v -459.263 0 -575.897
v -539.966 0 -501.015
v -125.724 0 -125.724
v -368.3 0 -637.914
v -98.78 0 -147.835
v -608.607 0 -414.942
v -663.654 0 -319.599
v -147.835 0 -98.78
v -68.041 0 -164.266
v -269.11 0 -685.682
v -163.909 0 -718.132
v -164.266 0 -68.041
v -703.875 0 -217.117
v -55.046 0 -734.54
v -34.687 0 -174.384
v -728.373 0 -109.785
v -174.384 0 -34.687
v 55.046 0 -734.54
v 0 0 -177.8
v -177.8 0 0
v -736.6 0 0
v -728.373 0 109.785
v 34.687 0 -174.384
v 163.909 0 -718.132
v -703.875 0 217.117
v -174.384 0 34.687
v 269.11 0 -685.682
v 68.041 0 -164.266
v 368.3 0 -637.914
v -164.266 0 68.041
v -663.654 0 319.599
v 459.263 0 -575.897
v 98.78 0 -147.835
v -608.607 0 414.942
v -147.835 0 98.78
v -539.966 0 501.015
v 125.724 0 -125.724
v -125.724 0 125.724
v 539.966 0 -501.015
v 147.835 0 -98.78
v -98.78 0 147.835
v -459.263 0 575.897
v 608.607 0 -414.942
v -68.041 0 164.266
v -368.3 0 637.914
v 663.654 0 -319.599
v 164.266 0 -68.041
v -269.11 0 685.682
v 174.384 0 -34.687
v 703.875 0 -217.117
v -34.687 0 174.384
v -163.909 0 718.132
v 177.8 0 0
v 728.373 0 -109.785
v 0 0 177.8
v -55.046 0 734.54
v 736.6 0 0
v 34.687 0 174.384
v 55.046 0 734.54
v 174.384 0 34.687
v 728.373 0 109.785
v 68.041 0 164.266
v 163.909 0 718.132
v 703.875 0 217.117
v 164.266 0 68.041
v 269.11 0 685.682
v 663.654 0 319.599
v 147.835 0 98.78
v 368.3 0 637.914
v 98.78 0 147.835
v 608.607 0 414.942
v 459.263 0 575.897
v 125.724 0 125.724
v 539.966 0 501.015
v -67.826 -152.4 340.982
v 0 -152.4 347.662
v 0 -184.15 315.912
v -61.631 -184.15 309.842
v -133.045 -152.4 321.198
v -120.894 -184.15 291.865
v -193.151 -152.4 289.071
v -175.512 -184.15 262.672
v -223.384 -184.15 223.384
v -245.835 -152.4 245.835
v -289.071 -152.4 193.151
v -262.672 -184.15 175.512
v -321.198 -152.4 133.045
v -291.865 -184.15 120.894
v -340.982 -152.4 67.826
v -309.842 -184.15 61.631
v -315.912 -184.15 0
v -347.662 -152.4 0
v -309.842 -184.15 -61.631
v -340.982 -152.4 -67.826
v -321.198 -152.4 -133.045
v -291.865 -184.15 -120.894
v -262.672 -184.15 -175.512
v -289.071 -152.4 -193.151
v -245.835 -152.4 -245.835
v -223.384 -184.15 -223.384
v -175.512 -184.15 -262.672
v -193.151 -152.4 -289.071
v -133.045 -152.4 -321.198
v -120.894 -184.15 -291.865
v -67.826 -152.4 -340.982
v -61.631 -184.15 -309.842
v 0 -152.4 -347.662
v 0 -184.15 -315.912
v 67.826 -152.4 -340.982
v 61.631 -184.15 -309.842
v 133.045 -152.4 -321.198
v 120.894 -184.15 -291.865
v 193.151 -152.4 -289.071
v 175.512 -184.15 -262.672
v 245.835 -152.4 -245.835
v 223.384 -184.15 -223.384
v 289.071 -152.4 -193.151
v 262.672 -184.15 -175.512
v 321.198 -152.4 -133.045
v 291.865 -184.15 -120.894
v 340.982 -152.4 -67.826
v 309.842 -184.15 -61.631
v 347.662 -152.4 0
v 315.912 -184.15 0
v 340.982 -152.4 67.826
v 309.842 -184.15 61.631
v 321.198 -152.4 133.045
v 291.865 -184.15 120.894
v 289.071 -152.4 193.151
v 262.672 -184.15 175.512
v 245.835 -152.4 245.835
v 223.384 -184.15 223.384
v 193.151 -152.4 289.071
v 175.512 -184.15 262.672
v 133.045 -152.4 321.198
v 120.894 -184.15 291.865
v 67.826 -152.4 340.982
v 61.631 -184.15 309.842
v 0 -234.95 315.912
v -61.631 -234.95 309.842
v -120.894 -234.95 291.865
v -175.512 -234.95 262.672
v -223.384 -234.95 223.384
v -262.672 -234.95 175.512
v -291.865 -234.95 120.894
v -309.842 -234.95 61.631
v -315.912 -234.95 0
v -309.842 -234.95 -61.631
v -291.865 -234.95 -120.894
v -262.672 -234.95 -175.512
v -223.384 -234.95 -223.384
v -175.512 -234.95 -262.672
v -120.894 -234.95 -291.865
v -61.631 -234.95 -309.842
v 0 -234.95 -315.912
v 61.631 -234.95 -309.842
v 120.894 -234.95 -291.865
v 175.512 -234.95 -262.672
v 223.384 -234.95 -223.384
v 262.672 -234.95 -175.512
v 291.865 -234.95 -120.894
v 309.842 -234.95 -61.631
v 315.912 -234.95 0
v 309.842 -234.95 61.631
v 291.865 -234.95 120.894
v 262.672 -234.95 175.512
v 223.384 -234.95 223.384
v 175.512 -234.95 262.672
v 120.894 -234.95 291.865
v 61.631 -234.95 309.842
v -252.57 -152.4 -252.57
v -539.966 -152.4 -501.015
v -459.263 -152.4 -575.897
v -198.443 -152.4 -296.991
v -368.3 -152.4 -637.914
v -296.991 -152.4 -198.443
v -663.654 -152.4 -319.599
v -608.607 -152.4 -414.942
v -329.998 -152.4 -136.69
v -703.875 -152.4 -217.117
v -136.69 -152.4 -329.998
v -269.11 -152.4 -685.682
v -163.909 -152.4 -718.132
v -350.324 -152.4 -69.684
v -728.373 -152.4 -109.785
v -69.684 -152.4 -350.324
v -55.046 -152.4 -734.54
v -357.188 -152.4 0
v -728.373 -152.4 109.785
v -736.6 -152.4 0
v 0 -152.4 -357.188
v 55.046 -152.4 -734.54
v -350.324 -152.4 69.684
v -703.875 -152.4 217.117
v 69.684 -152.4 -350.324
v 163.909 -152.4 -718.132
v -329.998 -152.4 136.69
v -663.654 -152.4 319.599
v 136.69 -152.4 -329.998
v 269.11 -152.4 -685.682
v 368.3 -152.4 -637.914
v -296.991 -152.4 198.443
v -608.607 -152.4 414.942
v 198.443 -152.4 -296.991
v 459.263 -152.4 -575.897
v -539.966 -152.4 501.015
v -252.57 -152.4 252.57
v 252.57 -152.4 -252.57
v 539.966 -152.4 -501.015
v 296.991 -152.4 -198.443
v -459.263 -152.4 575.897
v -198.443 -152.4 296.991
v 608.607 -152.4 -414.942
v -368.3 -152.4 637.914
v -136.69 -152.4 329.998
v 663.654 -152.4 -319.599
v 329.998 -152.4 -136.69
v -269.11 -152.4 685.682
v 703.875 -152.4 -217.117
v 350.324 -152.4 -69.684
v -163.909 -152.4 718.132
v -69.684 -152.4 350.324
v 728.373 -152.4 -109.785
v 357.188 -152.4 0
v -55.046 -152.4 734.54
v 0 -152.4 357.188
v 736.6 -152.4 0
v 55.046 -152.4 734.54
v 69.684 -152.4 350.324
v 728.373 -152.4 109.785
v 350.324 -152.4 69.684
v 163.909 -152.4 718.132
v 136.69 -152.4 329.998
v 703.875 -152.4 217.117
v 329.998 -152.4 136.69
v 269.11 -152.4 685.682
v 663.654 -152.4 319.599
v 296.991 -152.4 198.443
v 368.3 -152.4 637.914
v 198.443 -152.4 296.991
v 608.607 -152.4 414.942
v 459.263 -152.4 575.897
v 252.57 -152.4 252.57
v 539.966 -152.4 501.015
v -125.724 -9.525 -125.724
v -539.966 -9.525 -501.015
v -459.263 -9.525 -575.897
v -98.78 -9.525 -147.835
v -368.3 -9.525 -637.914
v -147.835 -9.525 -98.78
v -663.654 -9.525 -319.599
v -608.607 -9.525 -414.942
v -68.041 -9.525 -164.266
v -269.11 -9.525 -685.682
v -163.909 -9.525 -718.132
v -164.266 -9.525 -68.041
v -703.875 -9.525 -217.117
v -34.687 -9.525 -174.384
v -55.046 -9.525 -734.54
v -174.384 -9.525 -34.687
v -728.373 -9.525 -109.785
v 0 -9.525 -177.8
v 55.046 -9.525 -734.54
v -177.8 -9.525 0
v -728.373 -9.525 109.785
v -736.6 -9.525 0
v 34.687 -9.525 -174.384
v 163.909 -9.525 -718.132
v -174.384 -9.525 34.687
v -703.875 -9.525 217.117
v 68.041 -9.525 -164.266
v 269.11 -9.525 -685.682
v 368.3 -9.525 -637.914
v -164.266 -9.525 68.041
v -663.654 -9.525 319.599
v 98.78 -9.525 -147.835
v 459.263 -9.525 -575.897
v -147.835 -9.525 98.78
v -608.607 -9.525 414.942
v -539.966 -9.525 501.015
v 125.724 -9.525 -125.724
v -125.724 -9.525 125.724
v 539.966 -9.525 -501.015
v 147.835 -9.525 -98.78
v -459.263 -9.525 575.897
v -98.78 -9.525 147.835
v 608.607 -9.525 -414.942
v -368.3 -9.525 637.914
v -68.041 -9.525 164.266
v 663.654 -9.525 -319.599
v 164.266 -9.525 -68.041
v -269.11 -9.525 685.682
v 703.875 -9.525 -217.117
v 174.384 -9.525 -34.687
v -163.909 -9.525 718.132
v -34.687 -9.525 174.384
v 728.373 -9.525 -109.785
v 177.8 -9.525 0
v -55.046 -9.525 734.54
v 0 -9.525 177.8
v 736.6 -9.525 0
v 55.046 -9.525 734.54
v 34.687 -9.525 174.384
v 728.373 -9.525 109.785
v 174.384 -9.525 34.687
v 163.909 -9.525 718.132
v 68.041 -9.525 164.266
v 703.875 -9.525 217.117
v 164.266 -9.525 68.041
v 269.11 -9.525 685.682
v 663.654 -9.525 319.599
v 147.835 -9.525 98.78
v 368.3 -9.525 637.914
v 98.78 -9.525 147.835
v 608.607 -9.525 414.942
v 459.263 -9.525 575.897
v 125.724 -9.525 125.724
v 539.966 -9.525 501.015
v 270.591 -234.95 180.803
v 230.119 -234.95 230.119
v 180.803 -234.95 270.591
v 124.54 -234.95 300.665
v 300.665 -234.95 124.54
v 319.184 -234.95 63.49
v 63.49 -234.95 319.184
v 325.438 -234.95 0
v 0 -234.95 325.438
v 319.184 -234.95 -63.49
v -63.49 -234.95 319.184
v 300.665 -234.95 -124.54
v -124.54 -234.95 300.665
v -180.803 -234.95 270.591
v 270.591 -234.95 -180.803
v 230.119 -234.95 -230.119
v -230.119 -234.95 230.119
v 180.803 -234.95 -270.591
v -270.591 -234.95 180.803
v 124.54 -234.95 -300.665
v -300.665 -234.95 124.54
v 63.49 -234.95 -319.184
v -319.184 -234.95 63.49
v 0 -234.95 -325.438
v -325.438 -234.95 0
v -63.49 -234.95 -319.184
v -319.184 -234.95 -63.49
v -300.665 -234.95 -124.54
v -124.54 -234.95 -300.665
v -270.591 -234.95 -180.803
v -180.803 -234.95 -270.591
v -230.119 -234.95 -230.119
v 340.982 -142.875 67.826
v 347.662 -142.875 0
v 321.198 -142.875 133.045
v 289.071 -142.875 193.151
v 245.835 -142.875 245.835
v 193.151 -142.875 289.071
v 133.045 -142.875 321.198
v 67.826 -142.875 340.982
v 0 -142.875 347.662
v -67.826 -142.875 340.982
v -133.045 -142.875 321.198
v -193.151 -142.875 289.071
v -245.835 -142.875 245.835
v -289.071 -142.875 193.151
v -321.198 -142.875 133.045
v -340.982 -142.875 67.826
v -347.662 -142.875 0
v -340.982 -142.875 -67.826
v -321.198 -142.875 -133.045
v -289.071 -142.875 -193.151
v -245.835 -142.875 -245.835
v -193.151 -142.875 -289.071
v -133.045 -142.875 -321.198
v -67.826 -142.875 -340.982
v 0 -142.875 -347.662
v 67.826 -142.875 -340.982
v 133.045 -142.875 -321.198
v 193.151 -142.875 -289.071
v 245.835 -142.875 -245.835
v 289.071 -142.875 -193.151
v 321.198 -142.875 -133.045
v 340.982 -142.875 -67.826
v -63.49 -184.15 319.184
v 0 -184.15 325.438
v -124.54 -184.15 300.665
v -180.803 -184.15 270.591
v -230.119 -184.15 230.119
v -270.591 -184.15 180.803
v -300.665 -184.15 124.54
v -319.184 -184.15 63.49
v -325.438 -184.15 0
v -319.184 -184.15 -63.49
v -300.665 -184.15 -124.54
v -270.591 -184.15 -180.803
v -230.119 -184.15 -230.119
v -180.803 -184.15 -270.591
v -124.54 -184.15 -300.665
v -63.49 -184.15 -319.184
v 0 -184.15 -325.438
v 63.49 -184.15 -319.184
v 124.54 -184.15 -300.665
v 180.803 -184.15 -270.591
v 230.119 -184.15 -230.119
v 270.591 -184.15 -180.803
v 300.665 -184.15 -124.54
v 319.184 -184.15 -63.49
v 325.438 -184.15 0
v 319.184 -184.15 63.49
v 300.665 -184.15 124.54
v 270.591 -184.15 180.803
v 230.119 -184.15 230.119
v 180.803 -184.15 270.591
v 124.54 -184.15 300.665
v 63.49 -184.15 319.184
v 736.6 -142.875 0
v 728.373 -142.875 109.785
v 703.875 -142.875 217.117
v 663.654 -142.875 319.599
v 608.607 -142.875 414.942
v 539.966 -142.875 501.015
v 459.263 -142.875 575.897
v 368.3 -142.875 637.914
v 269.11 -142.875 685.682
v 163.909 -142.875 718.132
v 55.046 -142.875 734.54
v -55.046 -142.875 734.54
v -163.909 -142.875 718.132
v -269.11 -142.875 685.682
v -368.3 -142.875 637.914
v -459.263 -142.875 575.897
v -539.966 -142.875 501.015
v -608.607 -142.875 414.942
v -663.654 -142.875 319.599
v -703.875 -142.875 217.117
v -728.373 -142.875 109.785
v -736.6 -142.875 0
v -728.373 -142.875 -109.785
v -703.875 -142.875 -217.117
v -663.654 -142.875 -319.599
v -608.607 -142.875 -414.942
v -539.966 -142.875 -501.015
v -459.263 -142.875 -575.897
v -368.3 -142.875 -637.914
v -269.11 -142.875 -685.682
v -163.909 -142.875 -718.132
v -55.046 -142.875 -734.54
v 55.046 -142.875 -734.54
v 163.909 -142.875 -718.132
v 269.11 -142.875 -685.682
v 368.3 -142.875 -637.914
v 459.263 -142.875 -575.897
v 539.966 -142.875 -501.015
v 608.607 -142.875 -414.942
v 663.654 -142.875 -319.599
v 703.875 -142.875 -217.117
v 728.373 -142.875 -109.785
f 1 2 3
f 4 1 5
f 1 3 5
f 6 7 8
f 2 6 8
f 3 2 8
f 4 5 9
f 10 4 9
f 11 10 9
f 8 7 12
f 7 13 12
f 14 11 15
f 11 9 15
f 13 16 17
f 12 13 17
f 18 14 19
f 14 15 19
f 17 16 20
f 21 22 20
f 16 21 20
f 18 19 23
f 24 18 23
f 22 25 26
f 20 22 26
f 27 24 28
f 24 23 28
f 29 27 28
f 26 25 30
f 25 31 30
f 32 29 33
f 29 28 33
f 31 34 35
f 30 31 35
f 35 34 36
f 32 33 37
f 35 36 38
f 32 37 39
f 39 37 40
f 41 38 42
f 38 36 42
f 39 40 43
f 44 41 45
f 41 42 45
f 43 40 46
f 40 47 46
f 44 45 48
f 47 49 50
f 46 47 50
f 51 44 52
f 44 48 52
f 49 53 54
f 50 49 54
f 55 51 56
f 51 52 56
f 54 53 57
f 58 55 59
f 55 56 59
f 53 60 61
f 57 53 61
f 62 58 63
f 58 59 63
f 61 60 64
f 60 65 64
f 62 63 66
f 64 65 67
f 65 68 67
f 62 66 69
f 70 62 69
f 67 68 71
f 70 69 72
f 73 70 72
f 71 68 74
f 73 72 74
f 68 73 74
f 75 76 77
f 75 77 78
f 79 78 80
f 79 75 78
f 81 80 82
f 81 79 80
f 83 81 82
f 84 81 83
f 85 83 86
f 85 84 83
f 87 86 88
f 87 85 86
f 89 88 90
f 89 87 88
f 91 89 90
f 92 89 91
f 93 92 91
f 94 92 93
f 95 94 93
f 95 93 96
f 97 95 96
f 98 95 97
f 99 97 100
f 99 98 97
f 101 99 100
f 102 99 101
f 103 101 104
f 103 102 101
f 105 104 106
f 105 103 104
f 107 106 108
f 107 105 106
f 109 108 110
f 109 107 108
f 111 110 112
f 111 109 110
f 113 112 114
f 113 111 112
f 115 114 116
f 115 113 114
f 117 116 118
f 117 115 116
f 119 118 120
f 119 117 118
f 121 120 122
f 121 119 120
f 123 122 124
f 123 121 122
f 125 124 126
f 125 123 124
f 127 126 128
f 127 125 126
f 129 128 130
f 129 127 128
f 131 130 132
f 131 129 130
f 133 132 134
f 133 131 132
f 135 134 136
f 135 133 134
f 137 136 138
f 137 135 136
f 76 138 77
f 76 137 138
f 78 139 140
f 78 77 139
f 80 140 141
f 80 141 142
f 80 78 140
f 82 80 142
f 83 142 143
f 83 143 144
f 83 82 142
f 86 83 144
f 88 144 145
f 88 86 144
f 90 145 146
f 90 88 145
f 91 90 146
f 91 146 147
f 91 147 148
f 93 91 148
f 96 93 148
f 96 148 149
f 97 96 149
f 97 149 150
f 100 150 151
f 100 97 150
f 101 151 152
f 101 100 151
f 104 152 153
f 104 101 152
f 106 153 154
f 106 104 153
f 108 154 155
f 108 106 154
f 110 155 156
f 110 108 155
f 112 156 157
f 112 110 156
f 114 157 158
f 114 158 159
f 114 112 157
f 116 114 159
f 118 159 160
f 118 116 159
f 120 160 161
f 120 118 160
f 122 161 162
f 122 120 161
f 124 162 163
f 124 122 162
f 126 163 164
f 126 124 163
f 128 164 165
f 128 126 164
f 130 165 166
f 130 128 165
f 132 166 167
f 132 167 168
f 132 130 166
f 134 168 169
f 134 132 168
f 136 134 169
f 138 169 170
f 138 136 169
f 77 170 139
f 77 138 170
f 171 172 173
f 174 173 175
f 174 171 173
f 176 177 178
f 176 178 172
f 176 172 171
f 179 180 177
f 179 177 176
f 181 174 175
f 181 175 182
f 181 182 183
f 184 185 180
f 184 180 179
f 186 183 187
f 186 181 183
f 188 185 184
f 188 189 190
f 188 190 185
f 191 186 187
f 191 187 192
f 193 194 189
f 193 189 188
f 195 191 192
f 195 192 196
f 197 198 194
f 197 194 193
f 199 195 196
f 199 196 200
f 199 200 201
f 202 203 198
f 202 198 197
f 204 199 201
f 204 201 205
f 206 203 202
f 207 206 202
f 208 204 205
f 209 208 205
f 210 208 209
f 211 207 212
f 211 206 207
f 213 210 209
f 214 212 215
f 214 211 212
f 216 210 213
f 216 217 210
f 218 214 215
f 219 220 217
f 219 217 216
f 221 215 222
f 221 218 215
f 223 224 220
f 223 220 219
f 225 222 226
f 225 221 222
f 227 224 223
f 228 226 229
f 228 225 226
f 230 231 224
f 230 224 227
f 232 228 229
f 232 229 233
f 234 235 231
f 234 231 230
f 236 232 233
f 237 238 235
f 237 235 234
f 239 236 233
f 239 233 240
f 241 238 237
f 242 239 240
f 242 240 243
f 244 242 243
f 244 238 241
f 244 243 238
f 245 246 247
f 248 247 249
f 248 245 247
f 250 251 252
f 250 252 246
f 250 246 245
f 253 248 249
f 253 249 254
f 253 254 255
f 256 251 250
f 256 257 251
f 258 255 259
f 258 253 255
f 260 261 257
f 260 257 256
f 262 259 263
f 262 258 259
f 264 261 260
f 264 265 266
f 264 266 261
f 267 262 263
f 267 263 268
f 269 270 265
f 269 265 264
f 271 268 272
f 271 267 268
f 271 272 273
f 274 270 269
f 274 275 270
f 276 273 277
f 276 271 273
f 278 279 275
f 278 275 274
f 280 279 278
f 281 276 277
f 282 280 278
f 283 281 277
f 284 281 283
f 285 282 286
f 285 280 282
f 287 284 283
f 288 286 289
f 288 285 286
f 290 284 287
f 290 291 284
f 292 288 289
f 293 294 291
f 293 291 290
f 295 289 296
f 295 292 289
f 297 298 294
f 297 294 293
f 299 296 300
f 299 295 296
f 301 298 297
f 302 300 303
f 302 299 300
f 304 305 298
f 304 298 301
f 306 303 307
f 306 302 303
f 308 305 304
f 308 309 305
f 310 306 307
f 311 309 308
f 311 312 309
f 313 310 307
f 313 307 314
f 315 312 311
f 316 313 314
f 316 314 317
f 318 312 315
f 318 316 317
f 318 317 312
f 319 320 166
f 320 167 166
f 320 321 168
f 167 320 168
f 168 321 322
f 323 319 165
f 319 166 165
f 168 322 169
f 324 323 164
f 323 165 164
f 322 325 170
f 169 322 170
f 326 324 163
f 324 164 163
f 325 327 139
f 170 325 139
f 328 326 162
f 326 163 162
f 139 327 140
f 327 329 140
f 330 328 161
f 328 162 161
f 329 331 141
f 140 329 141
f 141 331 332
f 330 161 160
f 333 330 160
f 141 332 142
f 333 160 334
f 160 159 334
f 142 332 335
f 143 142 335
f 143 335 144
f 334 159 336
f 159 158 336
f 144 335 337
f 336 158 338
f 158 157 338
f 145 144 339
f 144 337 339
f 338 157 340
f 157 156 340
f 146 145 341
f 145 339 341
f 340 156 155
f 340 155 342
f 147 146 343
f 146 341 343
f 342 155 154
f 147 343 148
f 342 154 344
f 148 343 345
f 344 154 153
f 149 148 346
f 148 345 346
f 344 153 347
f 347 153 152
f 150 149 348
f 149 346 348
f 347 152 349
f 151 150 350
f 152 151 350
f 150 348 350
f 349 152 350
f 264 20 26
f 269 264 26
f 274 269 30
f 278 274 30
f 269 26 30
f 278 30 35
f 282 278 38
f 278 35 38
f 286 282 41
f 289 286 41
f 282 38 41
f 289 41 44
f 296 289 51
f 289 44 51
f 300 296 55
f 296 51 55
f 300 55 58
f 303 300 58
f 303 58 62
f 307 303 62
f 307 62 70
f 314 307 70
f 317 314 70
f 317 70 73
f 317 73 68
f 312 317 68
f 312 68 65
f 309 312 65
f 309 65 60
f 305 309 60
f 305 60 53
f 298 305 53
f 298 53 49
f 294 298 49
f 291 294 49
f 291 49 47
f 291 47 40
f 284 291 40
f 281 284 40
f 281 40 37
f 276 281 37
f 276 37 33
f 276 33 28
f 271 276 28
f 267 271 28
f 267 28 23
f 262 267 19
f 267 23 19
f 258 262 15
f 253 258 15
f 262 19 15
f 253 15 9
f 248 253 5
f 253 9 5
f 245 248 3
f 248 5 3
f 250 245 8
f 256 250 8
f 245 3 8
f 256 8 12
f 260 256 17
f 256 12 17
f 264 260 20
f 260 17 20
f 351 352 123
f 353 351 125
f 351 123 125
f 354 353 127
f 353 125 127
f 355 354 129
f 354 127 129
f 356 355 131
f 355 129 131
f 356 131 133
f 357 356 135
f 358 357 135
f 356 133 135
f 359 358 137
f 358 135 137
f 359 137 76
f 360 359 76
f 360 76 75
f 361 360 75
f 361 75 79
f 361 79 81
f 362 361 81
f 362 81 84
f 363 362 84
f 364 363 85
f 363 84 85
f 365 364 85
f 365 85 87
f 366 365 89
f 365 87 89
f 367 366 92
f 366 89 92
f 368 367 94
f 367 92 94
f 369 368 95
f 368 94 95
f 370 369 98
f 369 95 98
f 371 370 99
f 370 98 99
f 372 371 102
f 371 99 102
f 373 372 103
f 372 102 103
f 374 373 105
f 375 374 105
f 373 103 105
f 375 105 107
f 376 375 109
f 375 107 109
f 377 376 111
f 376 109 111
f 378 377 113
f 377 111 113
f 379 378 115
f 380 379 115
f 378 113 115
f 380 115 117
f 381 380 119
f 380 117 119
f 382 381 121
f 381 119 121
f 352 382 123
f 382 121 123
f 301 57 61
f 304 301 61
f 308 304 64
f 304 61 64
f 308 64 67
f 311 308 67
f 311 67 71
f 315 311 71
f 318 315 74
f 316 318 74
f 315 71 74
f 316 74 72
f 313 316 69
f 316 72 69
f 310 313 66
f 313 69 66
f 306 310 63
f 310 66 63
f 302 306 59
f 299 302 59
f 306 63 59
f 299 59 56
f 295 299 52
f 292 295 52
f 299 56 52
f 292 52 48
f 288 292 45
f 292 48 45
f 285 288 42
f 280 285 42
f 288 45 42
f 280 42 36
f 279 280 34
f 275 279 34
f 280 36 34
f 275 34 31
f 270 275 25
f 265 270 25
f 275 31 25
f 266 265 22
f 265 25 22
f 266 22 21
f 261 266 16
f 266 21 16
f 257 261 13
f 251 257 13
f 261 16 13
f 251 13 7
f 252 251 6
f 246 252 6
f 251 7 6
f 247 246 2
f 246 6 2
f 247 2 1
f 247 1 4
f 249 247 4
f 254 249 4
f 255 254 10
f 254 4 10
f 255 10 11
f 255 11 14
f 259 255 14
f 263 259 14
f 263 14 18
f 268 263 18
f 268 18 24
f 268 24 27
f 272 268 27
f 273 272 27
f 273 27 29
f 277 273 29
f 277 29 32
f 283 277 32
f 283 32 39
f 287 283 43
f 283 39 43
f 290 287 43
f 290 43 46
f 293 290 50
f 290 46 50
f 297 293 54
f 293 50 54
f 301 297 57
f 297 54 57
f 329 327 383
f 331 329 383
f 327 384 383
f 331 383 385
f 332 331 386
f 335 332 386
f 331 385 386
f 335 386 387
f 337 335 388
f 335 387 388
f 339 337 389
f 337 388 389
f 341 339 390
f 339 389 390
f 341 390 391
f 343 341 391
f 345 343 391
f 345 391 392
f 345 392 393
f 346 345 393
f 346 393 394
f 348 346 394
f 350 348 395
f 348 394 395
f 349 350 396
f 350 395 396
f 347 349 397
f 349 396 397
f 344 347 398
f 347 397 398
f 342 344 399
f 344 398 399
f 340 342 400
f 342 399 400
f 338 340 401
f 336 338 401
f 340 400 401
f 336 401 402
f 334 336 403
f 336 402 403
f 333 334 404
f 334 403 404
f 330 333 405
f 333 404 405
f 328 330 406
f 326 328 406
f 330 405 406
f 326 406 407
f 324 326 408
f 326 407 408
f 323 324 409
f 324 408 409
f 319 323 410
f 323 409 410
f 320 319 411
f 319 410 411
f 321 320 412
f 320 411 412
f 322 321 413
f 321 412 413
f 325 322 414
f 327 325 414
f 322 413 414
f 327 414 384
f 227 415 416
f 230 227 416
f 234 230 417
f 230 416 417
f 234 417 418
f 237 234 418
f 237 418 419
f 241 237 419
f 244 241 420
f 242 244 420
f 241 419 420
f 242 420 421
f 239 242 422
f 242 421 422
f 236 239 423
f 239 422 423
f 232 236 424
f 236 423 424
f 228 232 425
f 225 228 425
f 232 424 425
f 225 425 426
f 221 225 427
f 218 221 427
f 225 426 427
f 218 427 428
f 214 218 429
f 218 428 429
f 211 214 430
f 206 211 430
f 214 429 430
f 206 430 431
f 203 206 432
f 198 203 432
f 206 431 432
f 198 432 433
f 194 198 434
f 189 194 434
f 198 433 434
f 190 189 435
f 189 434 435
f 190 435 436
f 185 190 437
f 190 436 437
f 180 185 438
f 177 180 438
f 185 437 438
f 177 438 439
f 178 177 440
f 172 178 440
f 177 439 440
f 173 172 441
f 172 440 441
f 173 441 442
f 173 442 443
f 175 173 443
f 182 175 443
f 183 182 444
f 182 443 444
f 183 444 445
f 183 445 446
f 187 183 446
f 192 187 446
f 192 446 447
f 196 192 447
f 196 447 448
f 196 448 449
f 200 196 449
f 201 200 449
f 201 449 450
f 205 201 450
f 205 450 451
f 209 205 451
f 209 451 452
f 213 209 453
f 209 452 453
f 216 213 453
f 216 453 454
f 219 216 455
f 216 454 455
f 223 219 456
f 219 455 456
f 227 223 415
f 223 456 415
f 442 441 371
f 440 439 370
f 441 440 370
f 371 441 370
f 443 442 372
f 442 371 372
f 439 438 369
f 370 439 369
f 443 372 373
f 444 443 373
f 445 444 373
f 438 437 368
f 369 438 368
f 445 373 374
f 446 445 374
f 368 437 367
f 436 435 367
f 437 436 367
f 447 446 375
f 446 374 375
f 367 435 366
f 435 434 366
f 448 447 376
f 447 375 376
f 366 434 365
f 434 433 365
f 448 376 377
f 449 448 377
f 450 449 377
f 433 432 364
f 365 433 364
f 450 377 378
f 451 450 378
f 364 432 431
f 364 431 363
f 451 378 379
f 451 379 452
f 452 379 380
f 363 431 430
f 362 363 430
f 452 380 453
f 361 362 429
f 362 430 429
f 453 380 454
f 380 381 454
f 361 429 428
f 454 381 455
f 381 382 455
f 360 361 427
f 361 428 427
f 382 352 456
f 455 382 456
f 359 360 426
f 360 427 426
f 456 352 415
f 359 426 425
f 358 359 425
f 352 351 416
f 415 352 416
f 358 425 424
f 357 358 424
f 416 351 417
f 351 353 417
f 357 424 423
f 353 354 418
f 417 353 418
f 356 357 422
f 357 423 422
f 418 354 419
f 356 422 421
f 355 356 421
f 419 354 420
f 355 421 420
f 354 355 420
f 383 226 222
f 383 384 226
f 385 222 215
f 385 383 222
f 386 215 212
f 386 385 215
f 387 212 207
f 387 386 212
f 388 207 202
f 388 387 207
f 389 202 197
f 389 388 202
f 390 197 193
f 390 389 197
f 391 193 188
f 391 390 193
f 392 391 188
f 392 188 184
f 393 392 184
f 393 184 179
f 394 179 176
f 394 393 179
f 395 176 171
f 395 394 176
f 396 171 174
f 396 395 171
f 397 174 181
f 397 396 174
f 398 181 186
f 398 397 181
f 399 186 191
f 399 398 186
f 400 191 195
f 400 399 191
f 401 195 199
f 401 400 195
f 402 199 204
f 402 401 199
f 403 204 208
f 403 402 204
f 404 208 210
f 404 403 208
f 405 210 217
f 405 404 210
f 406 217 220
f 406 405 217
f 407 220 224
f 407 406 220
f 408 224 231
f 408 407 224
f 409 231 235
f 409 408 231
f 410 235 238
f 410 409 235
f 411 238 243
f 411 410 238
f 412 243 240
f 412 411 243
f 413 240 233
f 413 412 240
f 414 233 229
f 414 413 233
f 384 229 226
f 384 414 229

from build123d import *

# Parameters (mm, degrees)
F0_R      = 736.6
F1_DEPTH  = 9.525
F3_R      = 736.6
F4_DEPTH  = 9.525
F8_W      = 50.8
F8_H      = 9.525
F7_R      = 347.6625
F10_DEPTH = 25.4
F11_R     = 177.8
F12_DEPTH = 25.4


with BuildPart() as f1:
    # F0 (on Front) → F1 (new body)
    with BuildSketch(Plane.XZ):
        Circle(F0_R)
    extrude(amount=F1_DEPTH)

    # F11 (on face) → F12 (cut)
    with BuildSketch(Plane(origin=(0, 0, 0), x_dir=(-1, 0, 0), z_dir=(0, 1, 0))):
        Circle(F11_R)
    extrude(amount=-F12_DEPTH, mode=Mode.SUBTRACT)


with BuildPart() as f4:
    # F3 (on offset) → F4 (new body)
    with BuildSketch(Plane.XZ.offset(142.875)):
        Circle(F3_R)
    extrude(amount=F4_DEPTH)

    # F8 (on Right) → F9 (revolve)
    with BuildSketch(Plane.YZ):
        Polygon((-184.15, 325.4375), (-184.15, 315.9125), (-152.4, 347.6625), (-152.4, 357.1875), align=None)
        with Locations((-209.55, 320.675)):
            Rectangle(F8_W, F8_H)
    revolve(axis=Axis((0, -152.4, 0), (0, -1, 0)))

    # F7 (on face) → F10 (cut)
    with BuildSketch(Plane.XZ.offset(152.4)):
        Circle(F7_R)
    extrude(amount=-F10_DEPTH, mode=Mode.SUBTRACT)


solid = Compound([f1.part, f4.part])
